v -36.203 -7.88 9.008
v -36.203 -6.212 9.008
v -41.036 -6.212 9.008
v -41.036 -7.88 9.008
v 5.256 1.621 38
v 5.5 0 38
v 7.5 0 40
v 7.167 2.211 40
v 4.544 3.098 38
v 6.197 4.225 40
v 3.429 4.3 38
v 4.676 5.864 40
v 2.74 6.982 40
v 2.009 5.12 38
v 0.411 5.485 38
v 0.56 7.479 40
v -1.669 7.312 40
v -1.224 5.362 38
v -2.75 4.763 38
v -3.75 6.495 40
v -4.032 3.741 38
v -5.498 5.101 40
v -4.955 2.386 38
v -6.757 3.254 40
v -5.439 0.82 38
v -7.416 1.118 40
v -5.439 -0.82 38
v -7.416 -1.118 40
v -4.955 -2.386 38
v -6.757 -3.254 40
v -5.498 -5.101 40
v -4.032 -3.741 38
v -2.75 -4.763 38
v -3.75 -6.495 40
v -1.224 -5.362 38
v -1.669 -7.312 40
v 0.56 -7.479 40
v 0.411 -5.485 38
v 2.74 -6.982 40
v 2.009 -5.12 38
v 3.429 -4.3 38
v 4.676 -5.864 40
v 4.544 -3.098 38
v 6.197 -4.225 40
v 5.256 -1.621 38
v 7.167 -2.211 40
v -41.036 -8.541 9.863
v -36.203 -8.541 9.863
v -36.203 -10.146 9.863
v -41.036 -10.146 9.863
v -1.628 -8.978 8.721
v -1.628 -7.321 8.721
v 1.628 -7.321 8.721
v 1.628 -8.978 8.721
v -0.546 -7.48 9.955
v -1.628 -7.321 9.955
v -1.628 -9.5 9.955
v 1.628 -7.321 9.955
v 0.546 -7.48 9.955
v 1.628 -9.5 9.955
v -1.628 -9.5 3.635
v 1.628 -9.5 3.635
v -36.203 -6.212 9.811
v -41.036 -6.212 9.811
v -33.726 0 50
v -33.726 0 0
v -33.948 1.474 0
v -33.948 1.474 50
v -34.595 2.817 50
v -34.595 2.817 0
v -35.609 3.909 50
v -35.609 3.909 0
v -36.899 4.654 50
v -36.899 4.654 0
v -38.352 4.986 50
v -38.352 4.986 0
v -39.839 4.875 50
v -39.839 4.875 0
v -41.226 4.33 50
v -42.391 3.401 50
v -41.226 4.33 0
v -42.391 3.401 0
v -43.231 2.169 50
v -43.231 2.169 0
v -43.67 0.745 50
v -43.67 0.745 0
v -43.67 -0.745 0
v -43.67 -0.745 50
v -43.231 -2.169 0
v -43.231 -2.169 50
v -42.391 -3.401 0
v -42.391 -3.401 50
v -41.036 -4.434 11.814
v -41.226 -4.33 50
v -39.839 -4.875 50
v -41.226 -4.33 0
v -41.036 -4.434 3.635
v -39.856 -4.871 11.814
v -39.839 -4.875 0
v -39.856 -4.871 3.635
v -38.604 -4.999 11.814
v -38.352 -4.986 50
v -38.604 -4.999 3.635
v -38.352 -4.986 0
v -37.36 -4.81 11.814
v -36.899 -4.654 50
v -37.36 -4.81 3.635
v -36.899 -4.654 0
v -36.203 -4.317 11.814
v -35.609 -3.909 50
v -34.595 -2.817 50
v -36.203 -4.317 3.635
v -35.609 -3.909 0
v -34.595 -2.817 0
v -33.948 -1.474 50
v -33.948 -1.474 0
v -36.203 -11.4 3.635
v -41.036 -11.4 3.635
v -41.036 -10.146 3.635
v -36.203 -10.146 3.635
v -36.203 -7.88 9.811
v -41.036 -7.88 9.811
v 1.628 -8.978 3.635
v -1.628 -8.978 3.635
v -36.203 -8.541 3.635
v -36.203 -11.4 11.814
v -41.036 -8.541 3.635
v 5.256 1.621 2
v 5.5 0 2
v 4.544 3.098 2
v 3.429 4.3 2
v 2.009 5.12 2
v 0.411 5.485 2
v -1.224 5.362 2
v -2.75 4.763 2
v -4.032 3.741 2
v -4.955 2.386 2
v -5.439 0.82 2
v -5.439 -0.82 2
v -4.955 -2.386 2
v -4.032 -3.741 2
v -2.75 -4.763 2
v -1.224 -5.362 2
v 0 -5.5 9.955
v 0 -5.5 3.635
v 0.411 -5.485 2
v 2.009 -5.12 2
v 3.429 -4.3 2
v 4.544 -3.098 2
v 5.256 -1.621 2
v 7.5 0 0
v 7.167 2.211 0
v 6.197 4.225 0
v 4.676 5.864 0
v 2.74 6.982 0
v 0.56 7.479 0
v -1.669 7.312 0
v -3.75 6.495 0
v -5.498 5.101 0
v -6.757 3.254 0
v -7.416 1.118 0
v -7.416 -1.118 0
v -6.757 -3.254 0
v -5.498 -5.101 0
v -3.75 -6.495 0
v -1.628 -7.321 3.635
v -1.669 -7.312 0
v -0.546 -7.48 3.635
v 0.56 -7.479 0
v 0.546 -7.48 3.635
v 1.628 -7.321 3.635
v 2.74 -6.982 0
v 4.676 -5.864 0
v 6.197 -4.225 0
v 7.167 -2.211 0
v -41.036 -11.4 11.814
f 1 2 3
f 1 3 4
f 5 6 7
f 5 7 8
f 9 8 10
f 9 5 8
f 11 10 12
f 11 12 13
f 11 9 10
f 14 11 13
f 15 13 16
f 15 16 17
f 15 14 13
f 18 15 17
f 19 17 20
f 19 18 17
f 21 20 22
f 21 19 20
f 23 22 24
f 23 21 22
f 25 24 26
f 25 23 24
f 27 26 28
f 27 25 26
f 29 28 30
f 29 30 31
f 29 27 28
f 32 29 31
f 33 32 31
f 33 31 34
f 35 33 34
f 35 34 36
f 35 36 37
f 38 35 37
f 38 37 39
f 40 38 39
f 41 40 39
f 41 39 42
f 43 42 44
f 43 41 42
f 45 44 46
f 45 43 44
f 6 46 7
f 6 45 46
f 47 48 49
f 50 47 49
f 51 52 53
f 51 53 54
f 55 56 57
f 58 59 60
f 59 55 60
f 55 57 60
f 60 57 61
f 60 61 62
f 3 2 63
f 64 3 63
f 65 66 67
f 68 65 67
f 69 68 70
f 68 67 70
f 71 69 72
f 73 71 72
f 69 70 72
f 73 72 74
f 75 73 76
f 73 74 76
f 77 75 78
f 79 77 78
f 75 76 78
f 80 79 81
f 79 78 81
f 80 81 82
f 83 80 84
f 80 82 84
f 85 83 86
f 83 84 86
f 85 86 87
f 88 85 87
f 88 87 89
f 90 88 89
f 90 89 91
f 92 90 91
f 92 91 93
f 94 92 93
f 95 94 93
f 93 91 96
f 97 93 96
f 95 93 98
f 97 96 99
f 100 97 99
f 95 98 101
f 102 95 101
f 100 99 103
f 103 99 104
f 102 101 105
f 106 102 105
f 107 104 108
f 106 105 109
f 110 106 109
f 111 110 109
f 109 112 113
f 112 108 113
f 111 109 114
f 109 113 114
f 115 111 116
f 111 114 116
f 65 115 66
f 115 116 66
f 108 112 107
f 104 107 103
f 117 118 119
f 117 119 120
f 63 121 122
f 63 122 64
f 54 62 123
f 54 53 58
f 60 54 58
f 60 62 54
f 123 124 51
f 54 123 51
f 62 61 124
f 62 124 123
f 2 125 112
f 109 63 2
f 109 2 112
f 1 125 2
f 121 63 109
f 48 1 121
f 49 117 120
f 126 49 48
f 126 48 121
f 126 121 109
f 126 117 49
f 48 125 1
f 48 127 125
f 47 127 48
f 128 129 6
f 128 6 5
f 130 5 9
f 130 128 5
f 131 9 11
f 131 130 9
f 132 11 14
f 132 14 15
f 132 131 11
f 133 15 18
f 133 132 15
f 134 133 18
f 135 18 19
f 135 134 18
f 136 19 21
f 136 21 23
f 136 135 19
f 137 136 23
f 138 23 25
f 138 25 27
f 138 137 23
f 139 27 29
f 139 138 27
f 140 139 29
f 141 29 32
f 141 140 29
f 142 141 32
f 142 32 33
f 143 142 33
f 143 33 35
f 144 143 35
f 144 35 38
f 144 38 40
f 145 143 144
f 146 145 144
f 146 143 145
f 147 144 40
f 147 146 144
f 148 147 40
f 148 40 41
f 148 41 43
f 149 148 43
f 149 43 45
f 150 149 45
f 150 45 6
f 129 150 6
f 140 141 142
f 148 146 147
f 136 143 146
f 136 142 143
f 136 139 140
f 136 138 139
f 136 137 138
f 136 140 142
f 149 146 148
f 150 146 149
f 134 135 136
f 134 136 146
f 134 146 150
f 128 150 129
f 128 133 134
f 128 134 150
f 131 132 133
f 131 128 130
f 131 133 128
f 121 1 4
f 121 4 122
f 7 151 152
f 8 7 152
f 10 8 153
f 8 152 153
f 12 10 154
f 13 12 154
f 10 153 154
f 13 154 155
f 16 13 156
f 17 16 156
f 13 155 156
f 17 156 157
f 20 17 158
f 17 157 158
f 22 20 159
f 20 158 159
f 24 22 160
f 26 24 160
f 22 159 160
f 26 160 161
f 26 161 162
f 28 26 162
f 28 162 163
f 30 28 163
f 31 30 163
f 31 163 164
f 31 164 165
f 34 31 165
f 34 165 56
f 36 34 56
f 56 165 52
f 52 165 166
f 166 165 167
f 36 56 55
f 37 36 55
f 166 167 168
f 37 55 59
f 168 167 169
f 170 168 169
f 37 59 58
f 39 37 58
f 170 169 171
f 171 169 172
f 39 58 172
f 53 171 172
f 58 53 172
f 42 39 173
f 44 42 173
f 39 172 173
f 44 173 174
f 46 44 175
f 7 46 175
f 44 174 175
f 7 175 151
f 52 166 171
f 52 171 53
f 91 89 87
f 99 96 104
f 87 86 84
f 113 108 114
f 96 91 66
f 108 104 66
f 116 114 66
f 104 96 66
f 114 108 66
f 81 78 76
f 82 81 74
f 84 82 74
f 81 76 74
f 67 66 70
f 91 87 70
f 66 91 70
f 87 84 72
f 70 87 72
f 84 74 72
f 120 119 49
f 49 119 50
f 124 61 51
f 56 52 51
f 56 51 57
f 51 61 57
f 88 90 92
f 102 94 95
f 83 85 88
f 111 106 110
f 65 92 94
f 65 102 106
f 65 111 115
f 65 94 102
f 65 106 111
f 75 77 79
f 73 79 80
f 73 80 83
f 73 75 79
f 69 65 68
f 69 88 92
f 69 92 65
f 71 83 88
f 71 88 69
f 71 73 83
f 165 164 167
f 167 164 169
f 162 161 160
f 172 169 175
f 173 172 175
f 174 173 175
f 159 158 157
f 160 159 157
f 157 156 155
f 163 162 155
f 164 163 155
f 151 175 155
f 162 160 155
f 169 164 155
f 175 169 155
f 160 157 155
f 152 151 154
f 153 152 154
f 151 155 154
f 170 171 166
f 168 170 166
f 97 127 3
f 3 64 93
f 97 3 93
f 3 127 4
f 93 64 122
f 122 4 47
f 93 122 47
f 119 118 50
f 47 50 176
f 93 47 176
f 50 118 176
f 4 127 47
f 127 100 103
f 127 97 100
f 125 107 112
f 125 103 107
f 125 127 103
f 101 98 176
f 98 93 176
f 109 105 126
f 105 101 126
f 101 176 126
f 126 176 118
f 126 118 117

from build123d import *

# Parameters (mm, degrees)
F0_R      = 7.5
F1_DEPTH  = 40
F0_R_2    = 5
F2_DEPTH  = 50
F3_T      = -2
F5_W      = 4.8330873251
F5_H      = 8.1790685654
F6_DEPTH  = 3.9
F5_W_2    = 3.2551530749
F5_H_2    = 6.3201887533
F7_DEPTH  = 2
F8_W      = 1.0505022947
F8_H      = 0.8033253253
F8_W_2    = 0.6179423071
F9_DEPTH  = 4.8330873251
F10_W     = 1.6568034714
F10_H     = 5.0862235948
F11_DEPTH = 3.2551530749
F12_SIZE  = 1.99999
F13_W     = 1.6043800861
F13_H     = 6.2287077308
F14_DEPTH = 4.8330873251


# Not quite as in the source:
# - a fillet or chamfer is up to 0.001 mm smaller than in the source, because OpenCascade refuses the exact size
# - a feature names something its author has since deleted; it is built from what else it names


with BuildPart() as f1:
    # F0 (on Top) → F1 (new body)
    with BuildSketch(Plane.XY):
        Circle(F0_R)
    extrude(amount=F1_DEPTH)

    # F3
    f3_openings = [f1.faces().sort_by_distance(p)[0] for p in [
        (0, 0, 40),
    ]]
    offset(amount=F3_T, openings=f3_openings)

    # F5 (on offset) → F7 (join, symmetric)
    with BuildSketch(Plane.XZ.offset(7.5)):
        with Locations((0, 6.7948191427)):
            Rectangle(F5_W_2, F5_H_2)
    extrude(amount=F7_DEPTH, both=True)

    # F10 (on face) → F11 (cut, through all)
    with BuildSketch(Plane(origin=(-1.6275765374, 0, 0), x_dir=(0, -1, 0), z_dir=(-1, 0, 0))):
        with Locations((8.1496717495, 6.1778365634)):
            Rectangle(F10_W, F10_H)
    extrude(amount=-F11_DEPTH, mode=Mode.SUBTRACT)

    # F12 (size 2 in the source; OpenCascade refuses exactly that, so slightly less here)
    f12_edges = [f1.edges().sort_by_distance(p)[0] for p in [
        (-5.5, 0, 40),
    ]]
    chamfer(f12_edges, length=F12_SIZE)


with BuildPart() as f2:
    # F0 (on Top) → F2 (new body)
    with BuildSketch(Plane.XY):
        with Locations((-38.7259498239, 0)):
            Circle(F0_R_2)
    extrude(amount=F2_DEPTH)

    # F5 (on offset) → F6 (join, symmetric)
    with BuildSketch(Plane.XZ.offset(7.5)):
        with Locations((-38.6192724109, 7.7242590487)):
            Rectangle(F5_W, F5_H)
    extrude(amount=F6_DEPTH, both=True)

    # F8 (on face) → F9 (cut, through all)
    with BuildSketch(Plane(origin=(-41.0358160734, 0, 0), x_dir=(0, -1, 0), z_dir=(-1, 0, 0))):
        with Locations((7.3549995432, 9.4093019143)):
            Rectangle(F8_W, F8_H)
        with Locations((6.5207772423, 9.4093019143)):
            Rectangle(F8_W_2, F8_H)
    extrude(amount=-F9_DEPTH, mode=Mode.SUBTRACT)

    # F13 (on face) → F14 (cut, through all)
    with BuildSketch(Plane(origin=(-41.0358160734, 0, 0), x_dir=(0, -1, 0), z_dir=(-1, 0, 0))):
        with Locations((9.3433512375, 6.7490786314)):
            Rectangle(F13_W, F13_H)
    extrude(amount=-F14_DEPTH, mode=Mode.SUBTRACT)


solid = Compound([f1.part, f2.part])
